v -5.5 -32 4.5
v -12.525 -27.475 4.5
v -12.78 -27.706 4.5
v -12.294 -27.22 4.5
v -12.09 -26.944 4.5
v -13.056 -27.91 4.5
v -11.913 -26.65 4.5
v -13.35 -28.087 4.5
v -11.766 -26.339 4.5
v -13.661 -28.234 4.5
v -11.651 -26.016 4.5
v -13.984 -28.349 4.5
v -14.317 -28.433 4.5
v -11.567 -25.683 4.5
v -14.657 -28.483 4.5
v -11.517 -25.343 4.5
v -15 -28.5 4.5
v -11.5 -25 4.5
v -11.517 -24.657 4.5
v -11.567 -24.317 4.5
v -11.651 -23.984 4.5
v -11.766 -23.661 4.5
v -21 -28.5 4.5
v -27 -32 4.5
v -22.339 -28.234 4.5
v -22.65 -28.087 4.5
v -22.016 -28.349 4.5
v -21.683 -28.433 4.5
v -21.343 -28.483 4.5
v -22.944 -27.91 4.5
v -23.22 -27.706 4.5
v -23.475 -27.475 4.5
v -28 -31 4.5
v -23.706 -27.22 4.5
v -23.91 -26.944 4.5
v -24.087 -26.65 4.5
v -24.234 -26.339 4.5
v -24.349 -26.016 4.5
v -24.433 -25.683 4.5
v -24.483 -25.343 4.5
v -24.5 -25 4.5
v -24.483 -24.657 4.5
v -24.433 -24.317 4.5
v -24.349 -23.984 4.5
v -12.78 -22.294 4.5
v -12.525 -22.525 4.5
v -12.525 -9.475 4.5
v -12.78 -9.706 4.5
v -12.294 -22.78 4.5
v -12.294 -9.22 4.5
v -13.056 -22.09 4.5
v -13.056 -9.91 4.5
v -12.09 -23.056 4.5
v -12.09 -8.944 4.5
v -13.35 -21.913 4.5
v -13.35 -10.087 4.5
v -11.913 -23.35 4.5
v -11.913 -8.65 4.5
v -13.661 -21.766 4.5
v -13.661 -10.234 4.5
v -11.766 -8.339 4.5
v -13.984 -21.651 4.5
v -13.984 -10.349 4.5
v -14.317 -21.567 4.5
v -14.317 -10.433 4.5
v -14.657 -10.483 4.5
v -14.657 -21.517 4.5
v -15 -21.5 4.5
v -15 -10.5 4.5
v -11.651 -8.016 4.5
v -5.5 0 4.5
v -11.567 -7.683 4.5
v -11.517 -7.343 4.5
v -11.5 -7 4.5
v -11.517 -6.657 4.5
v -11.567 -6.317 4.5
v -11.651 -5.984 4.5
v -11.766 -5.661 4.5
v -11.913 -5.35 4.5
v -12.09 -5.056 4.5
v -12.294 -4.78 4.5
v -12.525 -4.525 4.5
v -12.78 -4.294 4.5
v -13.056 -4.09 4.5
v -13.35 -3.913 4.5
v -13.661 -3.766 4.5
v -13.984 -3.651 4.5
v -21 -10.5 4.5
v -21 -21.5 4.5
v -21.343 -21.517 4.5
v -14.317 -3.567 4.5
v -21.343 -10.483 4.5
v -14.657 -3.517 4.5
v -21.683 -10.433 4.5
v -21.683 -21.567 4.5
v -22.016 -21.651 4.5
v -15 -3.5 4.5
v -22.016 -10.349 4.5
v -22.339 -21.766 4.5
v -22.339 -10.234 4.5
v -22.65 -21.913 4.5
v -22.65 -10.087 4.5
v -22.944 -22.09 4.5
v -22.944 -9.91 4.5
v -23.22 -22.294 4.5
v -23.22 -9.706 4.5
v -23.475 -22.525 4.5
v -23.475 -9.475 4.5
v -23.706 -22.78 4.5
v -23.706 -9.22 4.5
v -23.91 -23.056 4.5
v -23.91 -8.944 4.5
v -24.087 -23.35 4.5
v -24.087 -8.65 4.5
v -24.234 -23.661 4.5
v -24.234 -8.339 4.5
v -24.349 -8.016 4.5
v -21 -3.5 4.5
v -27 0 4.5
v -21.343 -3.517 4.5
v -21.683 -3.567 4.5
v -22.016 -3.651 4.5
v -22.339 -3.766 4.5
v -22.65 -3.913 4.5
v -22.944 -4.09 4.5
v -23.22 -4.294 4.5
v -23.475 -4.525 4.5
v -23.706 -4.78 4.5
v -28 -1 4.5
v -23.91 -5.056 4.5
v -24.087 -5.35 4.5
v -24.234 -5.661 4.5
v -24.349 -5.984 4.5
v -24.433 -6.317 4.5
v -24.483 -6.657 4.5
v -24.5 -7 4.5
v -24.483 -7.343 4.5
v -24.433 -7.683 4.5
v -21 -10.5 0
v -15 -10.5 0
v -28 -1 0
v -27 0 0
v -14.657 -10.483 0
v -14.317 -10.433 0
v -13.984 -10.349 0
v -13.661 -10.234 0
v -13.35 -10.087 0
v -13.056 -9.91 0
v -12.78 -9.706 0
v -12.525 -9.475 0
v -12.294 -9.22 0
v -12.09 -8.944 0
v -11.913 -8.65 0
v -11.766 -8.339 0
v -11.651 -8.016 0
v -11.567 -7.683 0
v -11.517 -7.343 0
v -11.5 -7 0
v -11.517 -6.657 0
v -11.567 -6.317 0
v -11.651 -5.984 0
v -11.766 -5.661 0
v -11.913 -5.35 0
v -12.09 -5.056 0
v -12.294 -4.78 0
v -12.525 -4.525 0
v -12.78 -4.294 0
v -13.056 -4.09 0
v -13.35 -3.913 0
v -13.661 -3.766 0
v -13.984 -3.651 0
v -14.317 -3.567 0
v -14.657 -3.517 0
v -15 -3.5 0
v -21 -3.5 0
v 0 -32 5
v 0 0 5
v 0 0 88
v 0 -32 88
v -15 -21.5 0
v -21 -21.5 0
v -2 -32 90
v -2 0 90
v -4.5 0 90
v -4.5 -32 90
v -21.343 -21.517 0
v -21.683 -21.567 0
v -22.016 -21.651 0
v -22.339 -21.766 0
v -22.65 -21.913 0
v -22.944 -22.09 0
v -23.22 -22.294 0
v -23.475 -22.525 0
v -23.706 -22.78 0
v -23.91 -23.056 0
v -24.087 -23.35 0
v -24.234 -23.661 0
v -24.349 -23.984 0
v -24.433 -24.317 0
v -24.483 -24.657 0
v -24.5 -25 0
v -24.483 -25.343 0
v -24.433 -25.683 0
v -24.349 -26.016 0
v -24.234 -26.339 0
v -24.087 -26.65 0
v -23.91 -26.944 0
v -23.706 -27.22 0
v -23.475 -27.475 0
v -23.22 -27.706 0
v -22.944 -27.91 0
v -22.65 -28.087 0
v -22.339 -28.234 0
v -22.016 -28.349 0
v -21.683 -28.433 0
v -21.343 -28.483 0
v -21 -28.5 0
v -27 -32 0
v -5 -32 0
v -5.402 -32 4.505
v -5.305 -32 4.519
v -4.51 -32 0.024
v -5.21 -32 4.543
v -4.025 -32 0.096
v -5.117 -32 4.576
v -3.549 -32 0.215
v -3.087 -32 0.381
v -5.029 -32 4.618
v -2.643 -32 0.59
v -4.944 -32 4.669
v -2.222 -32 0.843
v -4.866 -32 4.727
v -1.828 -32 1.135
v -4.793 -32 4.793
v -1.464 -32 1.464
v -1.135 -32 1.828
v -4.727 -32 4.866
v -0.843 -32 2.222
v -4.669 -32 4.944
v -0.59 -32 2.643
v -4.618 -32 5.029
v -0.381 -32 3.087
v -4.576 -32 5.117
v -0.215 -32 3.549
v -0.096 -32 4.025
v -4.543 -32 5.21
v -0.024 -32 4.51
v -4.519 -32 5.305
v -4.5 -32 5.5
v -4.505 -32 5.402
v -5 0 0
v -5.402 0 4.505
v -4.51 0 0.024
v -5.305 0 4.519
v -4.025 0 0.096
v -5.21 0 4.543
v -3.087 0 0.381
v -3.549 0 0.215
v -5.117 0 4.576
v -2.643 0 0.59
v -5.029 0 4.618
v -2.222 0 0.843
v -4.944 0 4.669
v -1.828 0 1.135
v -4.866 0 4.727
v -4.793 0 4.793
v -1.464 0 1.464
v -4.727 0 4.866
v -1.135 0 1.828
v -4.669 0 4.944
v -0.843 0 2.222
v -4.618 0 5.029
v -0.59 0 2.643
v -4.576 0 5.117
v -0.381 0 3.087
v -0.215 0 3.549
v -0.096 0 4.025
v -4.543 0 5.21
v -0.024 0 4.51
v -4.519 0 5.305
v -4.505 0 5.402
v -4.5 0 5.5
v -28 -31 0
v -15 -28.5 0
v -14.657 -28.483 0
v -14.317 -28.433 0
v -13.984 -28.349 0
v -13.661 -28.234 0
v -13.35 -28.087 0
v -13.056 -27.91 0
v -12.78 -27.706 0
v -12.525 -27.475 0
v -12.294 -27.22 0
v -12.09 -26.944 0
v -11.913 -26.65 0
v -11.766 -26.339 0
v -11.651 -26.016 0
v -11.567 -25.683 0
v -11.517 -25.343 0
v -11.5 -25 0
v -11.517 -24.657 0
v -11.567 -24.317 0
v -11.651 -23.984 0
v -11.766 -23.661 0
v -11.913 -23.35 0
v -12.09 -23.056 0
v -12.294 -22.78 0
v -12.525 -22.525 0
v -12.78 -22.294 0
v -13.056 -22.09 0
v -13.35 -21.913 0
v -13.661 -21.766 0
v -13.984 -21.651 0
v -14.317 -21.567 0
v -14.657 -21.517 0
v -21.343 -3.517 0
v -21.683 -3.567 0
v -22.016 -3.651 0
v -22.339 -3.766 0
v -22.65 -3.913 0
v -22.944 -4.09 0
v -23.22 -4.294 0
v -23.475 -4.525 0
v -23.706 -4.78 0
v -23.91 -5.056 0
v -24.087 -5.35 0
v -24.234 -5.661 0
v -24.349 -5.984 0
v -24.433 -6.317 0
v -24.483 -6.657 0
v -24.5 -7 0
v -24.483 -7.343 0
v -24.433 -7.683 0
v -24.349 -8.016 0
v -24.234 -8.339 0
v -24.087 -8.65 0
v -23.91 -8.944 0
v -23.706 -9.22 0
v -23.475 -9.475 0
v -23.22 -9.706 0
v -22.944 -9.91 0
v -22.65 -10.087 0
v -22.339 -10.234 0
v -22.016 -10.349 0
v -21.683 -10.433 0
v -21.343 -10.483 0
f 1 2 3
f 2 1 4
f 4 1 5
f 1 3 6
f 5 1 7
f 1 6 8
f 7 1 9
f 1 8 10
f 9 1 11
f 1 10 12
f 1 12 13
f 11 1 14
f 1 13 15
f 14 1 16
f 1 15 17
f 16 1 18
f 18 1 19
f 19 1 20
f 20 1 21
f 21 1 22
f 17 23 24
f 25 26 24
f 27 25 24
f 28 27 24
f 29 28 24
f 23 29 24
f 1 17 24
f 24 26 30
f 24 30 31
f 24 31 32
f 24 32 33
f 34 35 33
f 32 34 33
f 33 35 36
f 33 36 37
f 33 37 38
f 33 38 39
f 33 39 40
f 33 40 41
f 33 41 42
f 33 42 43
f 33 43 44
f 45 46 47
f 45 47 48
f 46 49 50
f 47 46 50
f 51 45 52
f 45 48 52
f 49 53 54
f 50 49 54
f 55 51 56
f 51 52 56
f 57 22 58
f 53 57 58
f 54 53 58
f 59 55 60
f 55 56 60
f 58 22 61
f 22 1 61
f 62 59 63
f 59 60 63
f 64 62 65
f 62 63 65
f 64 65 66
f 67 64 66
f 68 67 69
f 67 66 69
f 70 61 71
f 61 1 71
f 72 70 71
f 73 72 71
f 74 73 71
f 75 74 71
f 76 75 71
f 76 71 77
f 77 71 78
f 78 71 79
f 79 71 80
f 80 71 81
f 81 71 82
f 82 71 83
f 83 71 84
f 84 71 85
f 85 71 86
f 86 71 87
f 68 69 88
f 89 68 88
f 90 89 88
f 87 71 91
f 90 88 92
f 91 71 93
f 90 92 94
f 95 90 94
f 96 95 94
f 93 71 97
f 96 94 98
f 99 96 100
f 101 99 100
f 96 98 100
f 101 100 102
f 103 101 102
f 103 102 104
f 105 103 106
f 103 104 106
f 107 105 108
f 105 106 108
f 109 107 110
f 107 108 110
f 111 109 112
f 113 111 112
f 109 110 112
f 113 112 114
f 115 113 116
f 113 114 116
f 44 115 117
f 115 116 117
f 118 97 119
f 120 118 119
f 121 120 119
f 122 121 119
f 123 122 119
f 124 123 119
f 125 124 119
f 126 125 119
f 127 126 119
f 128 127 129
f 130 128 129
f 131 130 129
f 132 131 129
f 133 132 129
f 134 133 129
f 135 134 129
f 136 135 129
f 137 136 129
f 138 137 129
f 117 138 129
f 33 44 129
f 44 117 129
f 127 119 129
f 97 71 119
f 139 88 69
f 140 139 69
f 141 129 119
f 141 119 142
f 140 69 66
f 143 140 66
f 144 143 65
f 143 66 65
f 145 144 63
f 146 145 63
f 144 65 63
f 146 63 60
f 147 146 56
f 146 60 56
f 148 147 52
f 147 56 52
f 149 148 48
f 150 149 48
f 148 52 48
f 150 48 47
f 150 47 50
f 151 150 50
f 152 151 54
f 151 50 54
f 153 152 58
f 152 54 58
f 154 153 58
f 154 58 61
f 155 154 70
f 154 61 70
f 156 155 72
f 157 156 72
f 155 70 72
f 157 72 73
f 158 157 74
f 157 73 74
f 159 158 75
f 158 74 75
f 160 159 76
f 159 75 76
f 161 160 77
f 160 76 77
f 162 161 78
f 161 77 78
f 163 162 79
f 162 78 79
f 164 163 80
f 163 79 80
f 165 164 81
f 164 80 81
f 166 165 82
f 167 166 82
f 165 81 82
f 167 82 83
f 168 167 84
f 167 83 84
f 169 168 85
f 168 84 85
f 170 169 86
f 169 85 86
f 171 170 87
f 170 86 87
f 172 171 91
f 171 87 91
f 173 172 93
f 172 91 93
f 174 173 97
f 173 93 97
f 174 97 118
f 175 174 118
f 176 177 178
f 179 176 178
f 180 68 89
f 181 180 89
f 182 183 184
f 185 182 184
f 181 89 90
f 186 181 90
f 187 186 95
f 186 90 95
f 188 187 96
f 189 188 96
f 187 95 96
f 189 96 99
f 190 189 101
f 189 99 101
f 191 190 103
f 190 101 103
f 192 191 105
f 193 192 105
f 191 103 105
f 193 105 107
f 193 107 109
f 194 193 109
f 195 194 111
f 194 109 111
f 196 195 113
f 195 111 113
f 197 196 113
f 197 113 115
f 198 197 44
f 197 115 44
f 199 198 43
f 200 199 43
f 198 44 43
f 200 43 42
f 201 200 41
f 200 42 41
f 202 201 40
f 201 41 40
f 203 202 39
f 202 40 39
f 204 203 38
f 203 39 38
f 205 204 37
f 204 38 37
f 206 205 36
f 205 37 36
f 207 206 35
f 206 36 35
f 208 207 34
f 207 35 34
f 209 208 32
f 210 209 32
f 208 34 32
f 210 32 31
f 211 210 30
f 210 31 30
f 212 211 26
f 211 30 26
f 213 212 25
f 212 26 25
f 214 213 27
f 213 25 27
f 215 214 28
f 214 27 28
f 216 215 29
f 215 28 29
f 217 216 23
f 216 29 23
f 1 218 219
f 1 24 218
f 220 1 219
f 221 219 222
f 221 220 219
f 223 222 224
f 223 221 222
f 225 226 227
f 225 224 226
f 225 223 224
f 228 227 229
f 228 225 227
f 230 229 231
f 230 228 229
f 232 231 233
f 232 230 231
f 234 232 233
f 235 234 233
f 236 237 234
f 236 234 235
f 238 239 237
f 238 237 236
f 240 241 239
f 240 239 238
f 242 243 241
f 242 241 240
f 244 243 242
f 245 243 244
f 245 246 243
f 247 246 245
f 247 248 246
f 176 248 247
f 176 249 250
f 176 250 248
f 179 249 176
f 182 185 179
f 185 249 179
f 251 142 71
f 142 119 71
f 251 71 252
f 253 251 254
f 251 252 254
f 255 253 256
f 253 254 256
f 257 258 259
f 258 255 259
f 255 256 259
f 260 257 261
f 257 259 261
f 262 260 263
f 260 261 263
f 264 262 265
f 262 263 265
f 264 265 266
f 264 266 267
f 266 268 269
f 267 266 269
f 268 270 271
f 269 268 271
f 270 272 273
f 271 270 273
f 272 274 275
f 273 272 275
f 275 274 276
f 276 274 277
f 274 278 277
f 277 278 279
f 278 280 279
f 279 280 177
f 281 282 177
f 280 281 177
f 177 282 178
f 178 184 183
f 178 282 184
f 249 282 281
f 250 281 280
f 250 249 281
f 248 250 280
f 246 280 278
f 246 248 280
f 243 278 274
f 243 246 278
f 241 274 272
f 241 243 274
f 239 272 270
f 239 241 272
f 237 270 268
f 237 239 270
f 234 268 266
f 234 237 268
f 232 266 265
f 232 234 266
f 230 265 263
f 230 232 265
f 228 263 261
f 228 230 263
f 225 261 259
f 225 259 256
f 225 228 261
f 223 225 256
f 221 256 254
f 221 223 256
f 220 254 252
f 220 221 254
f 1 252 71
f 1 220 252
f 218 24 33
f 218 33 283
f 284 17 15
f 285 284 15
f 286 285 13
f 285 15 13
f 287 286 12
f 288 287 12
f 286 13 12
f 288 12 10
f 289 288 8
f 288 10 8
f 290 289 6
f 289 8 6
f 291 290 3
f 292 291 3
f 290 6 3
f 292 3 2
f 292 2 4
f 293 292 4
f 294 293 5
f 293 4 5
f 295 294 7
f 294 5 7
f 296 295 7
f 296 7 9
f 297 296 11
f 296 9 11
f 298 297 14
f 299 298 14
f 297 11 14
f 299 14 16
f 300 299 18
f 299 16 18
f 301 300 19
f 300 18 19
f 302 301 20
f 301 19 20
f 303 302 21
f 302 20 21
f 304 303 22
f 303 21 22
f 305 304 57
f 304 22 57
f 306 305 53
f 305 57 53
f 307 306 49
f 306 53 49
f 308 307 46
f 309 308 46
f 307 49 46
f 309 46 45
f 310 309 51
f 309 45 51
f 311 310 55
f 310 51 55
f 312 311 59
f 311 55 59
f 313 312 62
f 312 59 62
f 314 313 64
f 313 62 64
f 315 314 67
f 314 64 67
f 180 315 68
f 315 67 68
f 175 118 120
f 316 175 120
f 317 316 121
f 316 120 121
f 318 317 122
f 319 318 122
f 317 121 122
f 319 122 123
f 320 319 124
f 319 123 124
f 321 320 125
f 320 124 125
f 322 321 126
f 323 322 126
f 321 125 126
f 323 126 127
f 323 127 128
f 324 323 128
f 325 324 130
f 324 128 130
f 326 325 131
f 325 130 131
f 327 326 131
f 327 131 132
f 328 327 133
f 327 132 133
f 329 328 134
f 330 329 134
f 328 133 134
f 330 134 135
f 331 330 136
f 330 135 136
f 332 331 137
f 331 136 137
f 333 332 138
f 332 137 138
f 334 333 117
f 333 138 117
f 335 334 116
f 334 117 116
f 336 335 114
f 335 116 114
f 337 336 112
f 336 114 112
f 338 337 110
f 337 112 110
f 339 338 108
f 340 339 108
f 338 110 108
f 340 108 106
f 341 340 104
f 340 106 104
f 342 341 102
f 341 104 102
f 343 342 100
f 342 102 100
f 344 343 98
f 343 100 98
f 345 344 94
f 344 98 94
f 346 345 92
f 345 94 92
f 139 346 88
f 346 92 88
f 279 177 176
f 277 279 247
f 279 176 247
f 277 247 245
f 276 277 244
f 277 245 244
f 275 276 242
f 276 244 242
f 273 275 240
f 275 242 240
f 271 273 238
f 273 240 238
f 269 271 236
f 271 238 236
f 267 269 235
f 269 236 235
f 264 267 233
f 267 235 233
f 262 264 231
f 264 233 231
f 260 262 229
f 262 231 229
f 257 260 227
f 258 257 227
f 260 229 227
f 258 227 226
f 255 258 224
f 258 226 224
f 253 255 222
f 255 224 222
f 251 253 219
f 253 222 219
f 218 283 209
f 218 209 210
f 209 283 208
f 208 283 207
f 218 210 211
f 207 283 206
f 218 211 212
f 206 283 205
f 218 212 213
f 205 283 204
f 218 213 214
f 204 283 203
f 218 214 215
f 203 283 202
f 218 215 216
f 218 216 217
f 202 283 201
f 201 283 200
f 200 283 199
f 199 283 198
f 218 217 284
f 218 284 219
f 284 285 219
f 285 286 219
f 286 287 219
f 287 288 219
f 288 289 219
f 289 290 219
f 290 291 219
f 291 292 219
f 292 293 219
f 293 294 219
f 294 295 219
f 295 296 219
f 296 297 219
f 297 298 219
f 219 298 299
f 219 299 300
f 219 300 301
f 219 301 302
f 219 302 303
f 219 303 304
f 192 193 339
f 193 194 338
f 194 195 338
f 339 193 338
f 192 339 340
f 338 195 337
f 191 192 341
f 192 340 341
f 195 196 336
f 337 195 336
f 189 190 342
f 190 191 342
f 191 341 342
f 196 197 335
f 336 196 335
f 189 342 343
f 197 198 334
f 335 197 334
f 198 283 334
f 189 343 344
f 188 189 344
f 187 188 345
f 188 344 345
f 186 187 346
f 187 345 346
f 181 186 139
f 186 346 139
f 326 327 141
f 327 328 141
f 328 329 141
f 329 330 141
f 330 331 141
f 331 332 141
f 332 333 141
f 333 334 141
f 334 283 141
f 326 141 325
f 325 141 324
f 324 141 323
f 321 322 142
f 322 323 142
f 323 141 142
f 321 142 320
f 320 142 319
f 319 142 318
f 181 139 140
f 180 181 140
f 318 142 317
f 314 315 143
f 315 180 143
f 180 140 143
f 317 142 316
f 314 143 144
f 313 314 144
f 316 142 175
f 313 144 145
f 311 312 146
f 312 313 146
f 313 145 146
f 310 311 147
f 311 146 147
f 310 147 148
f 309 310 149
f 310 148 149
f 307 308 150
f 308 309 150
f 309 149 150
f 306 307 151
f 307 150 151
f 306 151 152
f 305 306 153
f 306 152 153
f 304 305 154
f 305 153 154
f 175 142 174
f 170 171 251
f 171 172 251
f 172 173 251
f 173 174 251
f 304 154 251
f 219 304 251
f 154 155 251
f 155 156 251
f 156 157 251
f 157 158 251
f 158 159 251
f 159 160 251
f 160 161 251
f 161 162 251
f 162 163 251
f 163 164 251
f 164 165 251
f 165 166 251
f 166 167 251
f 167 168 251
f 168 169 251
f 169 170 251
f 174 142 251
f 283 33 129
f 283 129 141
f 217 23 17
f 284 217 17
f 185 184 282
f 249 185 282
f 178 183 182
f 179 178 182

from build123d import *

# Parameters (mm, degrees)
F1_DEPTH = 32
F2_R     = 1
F3_R     = 5
F4_SIZE  = 2
F5_SIZE  = 1
F7_DEPTH = 4.5


with BuildPart() as f1:
    # F0 (on Front) → F1 (new body)
    with BuildSketch(Plane.XZ):
        Polygon((0, 0), (0, 90), (-4.5, 90), (-4.5, 4.5), (-28, 4.5), (-28, 0), align=None)
    extrude(amount=F1_DEPTH)

    # F2
    f2_edges = [f1.edges().sort_by_distance(p)[0] for p in [
        (-4.5, -16, 4.5),
    ]]
    fillet(f2_edges, radius=F2_R)

    # F3
    f3_edges = [f1.edges().sort_by_distance(p)[0] for p in [
        (0, -16, 0),
    ]]
    fillet(f3_edges, radius=F3_R)

    # F4
    f4_edges = [f1.edges().sort_by_distance(p)[0] for p in [
        (0, -16, 90),
    ]]
    chamfer(f4_edges, length=F4_SIZE)

    # F5
    f5_edges = [f1.edges().sort_by_distance(p)[0] for p in [
        (-28, -32, 2.25),
        (-28, 0, 2.25),
    ]]
    chamfer(f5_edges, length=F5_SIZE)

    # F6 (on face) → F7 (cut)
    with BuildSketch(Plane.XY.offset(4.5)):
        with BuildLine():
            ThreePointArc((-15, -10.5), (-11.5, -7), (-15, -3.5))
            Line((-15, -3.5), (-21, -3.5))
            ThreePointArc((-21, -3.5), (-24.5, -7), (-21, -10.5))
            Line((-21, -10.5), (-15, -10.5))
        make_face()
        with BuildLine():
            ThreePointArc((-15, -28.5), (-11.5, -25), (-15, -21.5))
            Line((-15, -21.5), (-21, -21.5))
            ThreePointArc((-21, -21.5), (-24.5, -25), (-21, -28.5))
            Line((-21, -28.5), (-15, -28.5))
        make_face()
    extrude(amount=-F7_DEPTH, mode=Mode.SUBTRACT)


solid = f1.part
